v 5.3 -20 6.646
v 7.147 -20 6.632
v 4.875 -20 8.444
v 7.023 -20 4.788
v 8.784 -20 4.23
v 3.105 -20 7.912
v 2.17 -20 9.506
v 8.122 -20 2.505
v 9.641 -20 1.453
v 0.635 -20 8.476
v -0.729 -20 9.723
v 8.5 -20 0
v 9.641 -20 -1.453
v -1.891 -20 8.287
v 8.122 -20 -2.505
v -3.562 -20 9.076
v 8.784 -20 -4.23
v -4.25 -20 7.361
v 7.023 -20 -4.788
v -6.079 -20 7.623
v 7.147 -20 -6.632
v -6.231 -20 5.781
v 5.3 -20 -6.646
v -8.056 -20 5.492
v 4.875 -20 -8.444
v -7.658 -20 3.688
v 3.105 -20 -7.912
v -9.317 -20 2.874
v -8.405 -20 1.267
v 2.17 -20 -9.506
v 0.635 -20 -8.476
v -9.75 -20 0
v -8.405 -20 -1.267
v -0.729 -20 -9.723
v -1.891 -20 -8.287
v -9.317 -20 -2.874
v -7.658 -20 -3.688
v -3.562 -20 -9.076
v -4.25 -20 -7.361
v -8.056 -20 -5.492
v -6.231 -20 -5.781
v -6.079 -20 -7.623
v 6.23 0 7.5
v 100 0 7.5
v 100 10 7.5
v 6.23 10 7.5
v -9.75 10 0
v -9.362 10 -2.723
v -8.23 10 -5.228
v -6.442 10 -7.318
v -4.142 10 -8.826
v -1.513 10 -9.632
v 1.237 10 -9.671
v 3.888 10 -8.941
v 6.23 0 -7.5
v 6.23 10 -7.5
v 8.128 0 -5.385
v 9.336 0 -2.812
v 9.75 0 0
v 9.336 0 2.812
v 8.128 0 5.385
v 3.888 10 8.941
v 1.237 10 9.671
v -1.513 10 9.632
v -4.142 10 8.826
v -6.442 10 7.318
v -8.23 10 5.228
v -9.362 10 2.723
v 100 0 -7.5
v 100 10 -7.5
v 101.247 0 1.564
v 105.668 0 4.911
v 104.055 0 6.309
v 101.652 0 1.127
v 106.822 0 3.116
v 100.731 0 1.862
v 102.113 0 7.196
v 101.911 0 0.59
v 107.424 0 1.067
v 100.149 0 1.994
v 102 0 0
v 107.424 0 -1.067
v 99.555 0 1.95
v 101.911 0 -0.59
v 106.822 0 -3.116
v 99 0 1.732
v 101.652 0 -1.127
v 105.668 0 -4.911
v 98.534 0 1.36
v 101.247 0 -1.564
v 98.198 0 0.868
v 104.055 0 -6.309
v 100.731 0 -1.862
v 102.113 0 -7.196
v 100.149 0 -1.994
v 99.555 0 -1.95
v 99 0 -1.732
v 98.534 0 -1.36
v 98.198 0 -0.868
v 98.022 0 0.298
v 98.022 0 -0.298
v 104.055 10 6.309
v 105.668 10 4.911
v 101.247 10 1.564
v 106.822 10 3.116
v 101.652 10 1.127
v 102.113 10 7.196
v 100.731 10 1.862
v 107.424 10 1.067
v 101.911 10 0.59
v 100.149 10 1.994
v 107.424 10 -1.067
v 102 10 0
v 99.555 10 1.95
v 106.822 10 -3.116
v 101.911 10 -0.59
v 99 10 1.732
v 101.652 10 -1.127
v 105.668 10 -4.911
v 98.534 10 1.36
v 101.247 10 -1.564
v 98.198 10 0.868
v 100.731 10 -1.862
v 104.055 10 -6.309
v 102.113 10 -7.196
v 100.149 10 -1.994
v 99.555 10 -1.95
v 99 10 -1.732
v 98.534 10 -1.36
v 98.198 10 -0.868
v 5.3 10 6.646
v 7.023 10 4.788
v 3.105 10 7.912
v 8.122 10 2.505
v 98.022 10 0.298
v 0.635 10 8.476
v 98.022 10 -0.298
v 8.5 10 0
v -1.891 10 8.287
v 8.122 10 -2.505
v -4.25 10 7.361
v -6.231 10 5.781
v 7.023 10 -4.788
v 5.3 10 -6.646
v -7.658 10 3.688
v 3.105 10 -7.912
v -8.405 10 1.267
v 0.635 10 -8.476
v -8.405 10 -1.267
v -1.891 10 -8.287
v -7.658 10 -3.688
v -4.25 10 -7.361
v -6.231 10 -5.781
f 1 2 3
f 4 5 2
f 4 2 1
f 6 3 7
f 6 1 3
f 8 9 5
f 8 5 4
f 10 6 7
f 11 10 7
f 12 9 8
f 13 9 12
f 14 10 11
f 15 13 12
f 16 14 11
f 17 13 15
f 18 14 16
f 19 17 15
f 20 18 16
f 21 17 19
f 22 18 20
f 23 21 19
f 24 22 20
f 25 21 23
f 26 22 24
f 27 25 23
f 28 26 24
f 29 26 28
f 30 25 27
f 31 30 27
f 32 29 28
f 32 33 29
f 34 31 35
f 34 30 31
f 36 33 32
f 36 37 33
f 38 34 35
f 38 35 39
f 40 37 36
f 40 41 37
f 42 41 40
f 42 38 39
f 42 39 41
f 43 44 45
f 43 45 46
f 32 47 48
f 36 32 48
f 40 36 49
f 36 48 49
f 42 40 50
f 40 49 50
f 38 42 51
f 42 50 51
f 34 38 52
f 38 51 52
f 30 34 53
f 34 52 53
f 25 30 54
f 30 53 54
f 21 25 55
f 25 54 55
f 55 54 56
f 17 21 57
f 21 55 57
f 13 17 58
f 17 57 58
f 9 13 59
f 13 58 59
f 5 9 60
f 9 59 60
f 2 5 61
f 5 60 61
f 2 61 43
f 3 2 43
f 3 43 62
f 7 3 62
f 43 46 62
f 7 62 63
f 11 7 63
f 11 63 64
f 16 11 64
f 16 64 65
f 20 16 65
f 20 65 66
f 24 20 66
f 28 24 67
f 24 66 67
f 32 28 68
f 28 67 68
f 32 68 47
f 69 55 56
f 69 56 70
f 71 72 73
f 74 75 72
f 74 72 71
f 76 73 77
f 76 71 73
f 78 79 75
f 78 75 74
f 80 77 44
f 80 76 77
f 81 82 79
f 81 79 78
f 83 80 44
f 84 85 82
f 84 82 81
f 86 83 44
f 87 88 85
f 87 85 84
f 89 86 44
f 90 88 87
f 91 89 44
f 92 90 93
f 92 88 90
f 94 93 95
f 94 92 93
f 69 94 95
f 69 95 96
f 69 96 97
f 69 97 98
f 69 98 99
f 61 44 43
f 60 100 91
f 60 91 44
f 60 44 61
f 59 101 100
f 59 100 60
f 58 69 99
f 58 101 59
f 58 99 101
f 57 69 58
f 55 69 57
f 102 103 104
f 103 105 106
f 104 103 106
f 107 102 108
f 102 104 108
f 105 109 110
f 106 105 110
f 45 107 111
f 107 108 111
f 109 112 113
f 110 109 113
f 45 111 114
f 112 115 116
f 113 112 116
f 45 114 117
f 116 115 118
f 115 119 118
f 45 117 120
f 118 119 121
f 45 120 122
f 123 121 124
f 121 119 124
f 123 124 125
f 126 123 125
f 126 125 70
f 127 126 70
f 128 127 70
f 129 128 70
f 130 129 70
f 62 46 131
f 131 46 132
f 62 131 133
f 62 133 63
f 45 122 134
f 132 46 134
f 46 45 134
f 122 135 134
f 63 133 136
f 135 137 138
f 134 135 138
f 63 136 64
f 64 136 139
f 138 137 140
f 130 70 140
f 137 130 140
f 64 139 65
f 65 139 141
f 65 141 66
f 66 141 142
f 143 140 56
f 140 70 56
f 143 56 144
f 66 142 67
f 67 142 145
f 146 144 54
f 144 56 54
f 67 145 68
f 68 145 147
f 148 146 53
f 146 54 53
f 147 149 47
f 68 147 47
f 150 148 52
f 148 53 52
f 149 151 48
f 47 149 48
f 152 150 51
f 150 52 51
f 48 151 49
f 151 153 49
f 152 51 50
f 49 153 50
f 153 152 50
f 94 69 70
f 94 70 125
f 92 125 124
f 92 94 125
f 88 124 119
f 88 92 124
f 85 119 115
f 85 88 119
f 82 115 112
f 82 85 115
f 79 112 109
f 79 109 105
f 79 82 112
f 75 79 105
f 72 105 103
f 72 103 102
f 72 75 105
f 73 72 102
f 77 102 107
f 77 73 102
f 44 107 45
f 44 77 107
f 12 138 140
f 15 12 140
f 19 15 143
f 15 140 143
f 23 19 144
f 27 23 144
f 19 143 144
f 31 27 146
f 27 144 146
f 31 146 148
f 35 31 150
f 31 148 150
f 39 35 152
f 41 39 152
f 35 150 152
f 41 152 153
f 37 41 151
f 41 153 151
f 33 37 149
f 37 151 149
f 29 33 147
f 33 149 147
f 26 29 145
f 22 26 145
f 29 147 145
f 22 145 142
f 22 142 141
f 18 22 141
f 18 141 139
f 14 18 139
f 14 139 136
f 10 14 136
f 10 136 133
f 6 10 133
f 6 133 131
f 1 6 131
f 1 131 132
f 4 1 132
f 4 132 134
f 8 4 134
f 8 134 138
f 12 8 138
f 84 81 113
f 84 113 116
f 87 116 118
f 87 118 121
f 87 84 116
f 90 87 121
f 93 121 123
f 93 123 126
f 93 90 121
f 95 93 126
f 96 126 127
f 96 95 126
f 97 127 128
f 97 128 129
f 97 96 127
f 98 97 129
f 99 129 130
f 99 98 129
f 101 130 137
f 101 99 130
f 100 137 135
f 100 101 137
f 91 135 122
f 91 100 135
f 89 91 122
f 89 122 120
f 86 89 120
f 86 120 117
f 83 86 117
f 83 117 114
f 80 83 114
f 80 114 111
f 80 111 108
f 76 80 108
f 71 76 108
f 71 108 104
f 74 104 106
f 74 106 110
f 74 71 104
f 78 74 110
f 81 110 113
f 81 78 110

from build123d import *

# Parameters (mm, degrees)
SKETCH2_R           = 2.5
SKETCH2_R_2         = 2
BOSS_EXTRUDE1_DEPTH = 10
SKETCH3_R           = 9.75
BOSS_EXTRUDE2_DEPTH = 30
CUT_EXTRUDE1_REACH  = 32
SKETCH4_R           = 8.5


with BuildPart() as part:
    # Sketch2 → Boss-Extrude1 (new body)
    with BuildSketch(Plane(origin=(0, 0, 0), x_dir=(1, 0, 0), z_dir=(0, 1, 0))):
        with BuildLine():
            Line((0, 7.5), (100, 7.5))
            ThreePointArc((100, 7.5), (107.5, 0), (100, -7.5))
            Line((100, -7.5), (0, -7.5))
            ThreePointArc((0, -7.5), (-7.5, 0), (0, 7.5))
        make_face()
        Circle(SKETCH2_R, mode=Mode.SUBTRACT)
        with Locations((100, 0)):
            Circle(SKETCH2_R_2, mode=Mode.SUBTRACT)
    extrude(amount=BOSS_EXTRUDE1_DEPTH)

    # Sketch3 → Boss-Extrude2 (add)
    with BuildSketch(Plane(origin=(0, 10, 0), x_dir=(-1, 0, 0), z_dir=(0, -1, 0))):
        Circle(SKETCH3_R)
    extrude(amount=BOSS_EXTRUDE2_DEPTH)

    # Sketch4 → Cut-Extrude1 (cut, up to next)
    with BuildSketch(Plane(origin=(0, 10, 0), x_dir=(1, 0, 0), z_dir=(0, 1, 0)), mode=Mode.PRIVATE) as cut_extrude1_sk1:
        Circle(SKETCH4_R)
    cut_extrude1_tool1 = extrude(cut_extrude1_sk1.sketch, amount=-CUT_EXTRUDE1_REACH, mode=Mode.PRIVATE) & part.part
    add(cut_extrude1_tool1.solids().sort_by_distance((0, 10, 0))[0], mode=Mode.SUBTRACT)


solid = part.part
